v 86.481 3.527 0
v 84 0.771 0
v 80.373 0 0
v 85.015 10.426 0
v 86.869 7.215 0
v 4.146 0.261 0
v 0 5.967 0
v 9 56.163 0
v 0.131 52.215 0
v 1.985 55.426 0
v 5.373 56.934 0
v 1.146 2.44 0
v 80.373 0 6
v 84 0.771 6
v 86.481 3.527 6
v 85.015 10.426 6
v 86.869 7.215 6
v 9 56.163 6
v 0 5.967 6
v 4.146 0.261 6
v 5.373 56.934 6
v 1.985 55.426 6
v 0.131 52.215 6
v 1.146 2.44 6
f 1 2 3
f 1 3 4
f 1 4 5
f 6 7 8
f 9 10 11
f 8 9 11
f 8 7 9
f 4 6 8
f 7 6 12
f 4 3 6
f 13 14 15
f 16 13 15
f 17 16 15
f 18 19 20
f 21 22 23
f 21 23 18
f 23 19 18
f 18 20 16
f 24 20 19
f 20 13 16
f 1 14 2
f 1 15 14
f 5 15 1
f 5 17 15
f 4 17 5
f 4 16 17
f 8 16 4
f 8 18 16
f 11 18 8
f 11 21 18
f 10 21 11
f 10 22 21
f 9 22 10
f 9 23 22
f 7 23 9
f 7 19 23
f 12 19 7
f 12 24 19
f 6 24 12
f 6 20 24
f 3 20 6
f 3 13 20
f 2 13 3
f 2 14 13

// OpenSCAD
$fn = 32;

// ----------------------------------------------------------------------
// Lever arm: two bosses 12 and 12 mm, 75 mm between centres
// ----------------------------------------------------------------------

// --- parameters (mm) ---
profile_height = 6;       // extrusion height
profile_points = 12;      // points of the closed outline

profile = [[0, 5.967], [1.146, 2.44], [4.146, 0.261], [80.373, 0], [84, 0.771], [86.481, 3.527], [86.869, 7.215], [85.015, 10.426], [9, 56.163], [5.373, 56.934], [1.985, 55.426], [0.131, 52.215]];  // single closed polygon, 12 points, counter clockwise

// --- the one profile operation ---
linear_extrude(height = profile_height) polygon(points = profile);
